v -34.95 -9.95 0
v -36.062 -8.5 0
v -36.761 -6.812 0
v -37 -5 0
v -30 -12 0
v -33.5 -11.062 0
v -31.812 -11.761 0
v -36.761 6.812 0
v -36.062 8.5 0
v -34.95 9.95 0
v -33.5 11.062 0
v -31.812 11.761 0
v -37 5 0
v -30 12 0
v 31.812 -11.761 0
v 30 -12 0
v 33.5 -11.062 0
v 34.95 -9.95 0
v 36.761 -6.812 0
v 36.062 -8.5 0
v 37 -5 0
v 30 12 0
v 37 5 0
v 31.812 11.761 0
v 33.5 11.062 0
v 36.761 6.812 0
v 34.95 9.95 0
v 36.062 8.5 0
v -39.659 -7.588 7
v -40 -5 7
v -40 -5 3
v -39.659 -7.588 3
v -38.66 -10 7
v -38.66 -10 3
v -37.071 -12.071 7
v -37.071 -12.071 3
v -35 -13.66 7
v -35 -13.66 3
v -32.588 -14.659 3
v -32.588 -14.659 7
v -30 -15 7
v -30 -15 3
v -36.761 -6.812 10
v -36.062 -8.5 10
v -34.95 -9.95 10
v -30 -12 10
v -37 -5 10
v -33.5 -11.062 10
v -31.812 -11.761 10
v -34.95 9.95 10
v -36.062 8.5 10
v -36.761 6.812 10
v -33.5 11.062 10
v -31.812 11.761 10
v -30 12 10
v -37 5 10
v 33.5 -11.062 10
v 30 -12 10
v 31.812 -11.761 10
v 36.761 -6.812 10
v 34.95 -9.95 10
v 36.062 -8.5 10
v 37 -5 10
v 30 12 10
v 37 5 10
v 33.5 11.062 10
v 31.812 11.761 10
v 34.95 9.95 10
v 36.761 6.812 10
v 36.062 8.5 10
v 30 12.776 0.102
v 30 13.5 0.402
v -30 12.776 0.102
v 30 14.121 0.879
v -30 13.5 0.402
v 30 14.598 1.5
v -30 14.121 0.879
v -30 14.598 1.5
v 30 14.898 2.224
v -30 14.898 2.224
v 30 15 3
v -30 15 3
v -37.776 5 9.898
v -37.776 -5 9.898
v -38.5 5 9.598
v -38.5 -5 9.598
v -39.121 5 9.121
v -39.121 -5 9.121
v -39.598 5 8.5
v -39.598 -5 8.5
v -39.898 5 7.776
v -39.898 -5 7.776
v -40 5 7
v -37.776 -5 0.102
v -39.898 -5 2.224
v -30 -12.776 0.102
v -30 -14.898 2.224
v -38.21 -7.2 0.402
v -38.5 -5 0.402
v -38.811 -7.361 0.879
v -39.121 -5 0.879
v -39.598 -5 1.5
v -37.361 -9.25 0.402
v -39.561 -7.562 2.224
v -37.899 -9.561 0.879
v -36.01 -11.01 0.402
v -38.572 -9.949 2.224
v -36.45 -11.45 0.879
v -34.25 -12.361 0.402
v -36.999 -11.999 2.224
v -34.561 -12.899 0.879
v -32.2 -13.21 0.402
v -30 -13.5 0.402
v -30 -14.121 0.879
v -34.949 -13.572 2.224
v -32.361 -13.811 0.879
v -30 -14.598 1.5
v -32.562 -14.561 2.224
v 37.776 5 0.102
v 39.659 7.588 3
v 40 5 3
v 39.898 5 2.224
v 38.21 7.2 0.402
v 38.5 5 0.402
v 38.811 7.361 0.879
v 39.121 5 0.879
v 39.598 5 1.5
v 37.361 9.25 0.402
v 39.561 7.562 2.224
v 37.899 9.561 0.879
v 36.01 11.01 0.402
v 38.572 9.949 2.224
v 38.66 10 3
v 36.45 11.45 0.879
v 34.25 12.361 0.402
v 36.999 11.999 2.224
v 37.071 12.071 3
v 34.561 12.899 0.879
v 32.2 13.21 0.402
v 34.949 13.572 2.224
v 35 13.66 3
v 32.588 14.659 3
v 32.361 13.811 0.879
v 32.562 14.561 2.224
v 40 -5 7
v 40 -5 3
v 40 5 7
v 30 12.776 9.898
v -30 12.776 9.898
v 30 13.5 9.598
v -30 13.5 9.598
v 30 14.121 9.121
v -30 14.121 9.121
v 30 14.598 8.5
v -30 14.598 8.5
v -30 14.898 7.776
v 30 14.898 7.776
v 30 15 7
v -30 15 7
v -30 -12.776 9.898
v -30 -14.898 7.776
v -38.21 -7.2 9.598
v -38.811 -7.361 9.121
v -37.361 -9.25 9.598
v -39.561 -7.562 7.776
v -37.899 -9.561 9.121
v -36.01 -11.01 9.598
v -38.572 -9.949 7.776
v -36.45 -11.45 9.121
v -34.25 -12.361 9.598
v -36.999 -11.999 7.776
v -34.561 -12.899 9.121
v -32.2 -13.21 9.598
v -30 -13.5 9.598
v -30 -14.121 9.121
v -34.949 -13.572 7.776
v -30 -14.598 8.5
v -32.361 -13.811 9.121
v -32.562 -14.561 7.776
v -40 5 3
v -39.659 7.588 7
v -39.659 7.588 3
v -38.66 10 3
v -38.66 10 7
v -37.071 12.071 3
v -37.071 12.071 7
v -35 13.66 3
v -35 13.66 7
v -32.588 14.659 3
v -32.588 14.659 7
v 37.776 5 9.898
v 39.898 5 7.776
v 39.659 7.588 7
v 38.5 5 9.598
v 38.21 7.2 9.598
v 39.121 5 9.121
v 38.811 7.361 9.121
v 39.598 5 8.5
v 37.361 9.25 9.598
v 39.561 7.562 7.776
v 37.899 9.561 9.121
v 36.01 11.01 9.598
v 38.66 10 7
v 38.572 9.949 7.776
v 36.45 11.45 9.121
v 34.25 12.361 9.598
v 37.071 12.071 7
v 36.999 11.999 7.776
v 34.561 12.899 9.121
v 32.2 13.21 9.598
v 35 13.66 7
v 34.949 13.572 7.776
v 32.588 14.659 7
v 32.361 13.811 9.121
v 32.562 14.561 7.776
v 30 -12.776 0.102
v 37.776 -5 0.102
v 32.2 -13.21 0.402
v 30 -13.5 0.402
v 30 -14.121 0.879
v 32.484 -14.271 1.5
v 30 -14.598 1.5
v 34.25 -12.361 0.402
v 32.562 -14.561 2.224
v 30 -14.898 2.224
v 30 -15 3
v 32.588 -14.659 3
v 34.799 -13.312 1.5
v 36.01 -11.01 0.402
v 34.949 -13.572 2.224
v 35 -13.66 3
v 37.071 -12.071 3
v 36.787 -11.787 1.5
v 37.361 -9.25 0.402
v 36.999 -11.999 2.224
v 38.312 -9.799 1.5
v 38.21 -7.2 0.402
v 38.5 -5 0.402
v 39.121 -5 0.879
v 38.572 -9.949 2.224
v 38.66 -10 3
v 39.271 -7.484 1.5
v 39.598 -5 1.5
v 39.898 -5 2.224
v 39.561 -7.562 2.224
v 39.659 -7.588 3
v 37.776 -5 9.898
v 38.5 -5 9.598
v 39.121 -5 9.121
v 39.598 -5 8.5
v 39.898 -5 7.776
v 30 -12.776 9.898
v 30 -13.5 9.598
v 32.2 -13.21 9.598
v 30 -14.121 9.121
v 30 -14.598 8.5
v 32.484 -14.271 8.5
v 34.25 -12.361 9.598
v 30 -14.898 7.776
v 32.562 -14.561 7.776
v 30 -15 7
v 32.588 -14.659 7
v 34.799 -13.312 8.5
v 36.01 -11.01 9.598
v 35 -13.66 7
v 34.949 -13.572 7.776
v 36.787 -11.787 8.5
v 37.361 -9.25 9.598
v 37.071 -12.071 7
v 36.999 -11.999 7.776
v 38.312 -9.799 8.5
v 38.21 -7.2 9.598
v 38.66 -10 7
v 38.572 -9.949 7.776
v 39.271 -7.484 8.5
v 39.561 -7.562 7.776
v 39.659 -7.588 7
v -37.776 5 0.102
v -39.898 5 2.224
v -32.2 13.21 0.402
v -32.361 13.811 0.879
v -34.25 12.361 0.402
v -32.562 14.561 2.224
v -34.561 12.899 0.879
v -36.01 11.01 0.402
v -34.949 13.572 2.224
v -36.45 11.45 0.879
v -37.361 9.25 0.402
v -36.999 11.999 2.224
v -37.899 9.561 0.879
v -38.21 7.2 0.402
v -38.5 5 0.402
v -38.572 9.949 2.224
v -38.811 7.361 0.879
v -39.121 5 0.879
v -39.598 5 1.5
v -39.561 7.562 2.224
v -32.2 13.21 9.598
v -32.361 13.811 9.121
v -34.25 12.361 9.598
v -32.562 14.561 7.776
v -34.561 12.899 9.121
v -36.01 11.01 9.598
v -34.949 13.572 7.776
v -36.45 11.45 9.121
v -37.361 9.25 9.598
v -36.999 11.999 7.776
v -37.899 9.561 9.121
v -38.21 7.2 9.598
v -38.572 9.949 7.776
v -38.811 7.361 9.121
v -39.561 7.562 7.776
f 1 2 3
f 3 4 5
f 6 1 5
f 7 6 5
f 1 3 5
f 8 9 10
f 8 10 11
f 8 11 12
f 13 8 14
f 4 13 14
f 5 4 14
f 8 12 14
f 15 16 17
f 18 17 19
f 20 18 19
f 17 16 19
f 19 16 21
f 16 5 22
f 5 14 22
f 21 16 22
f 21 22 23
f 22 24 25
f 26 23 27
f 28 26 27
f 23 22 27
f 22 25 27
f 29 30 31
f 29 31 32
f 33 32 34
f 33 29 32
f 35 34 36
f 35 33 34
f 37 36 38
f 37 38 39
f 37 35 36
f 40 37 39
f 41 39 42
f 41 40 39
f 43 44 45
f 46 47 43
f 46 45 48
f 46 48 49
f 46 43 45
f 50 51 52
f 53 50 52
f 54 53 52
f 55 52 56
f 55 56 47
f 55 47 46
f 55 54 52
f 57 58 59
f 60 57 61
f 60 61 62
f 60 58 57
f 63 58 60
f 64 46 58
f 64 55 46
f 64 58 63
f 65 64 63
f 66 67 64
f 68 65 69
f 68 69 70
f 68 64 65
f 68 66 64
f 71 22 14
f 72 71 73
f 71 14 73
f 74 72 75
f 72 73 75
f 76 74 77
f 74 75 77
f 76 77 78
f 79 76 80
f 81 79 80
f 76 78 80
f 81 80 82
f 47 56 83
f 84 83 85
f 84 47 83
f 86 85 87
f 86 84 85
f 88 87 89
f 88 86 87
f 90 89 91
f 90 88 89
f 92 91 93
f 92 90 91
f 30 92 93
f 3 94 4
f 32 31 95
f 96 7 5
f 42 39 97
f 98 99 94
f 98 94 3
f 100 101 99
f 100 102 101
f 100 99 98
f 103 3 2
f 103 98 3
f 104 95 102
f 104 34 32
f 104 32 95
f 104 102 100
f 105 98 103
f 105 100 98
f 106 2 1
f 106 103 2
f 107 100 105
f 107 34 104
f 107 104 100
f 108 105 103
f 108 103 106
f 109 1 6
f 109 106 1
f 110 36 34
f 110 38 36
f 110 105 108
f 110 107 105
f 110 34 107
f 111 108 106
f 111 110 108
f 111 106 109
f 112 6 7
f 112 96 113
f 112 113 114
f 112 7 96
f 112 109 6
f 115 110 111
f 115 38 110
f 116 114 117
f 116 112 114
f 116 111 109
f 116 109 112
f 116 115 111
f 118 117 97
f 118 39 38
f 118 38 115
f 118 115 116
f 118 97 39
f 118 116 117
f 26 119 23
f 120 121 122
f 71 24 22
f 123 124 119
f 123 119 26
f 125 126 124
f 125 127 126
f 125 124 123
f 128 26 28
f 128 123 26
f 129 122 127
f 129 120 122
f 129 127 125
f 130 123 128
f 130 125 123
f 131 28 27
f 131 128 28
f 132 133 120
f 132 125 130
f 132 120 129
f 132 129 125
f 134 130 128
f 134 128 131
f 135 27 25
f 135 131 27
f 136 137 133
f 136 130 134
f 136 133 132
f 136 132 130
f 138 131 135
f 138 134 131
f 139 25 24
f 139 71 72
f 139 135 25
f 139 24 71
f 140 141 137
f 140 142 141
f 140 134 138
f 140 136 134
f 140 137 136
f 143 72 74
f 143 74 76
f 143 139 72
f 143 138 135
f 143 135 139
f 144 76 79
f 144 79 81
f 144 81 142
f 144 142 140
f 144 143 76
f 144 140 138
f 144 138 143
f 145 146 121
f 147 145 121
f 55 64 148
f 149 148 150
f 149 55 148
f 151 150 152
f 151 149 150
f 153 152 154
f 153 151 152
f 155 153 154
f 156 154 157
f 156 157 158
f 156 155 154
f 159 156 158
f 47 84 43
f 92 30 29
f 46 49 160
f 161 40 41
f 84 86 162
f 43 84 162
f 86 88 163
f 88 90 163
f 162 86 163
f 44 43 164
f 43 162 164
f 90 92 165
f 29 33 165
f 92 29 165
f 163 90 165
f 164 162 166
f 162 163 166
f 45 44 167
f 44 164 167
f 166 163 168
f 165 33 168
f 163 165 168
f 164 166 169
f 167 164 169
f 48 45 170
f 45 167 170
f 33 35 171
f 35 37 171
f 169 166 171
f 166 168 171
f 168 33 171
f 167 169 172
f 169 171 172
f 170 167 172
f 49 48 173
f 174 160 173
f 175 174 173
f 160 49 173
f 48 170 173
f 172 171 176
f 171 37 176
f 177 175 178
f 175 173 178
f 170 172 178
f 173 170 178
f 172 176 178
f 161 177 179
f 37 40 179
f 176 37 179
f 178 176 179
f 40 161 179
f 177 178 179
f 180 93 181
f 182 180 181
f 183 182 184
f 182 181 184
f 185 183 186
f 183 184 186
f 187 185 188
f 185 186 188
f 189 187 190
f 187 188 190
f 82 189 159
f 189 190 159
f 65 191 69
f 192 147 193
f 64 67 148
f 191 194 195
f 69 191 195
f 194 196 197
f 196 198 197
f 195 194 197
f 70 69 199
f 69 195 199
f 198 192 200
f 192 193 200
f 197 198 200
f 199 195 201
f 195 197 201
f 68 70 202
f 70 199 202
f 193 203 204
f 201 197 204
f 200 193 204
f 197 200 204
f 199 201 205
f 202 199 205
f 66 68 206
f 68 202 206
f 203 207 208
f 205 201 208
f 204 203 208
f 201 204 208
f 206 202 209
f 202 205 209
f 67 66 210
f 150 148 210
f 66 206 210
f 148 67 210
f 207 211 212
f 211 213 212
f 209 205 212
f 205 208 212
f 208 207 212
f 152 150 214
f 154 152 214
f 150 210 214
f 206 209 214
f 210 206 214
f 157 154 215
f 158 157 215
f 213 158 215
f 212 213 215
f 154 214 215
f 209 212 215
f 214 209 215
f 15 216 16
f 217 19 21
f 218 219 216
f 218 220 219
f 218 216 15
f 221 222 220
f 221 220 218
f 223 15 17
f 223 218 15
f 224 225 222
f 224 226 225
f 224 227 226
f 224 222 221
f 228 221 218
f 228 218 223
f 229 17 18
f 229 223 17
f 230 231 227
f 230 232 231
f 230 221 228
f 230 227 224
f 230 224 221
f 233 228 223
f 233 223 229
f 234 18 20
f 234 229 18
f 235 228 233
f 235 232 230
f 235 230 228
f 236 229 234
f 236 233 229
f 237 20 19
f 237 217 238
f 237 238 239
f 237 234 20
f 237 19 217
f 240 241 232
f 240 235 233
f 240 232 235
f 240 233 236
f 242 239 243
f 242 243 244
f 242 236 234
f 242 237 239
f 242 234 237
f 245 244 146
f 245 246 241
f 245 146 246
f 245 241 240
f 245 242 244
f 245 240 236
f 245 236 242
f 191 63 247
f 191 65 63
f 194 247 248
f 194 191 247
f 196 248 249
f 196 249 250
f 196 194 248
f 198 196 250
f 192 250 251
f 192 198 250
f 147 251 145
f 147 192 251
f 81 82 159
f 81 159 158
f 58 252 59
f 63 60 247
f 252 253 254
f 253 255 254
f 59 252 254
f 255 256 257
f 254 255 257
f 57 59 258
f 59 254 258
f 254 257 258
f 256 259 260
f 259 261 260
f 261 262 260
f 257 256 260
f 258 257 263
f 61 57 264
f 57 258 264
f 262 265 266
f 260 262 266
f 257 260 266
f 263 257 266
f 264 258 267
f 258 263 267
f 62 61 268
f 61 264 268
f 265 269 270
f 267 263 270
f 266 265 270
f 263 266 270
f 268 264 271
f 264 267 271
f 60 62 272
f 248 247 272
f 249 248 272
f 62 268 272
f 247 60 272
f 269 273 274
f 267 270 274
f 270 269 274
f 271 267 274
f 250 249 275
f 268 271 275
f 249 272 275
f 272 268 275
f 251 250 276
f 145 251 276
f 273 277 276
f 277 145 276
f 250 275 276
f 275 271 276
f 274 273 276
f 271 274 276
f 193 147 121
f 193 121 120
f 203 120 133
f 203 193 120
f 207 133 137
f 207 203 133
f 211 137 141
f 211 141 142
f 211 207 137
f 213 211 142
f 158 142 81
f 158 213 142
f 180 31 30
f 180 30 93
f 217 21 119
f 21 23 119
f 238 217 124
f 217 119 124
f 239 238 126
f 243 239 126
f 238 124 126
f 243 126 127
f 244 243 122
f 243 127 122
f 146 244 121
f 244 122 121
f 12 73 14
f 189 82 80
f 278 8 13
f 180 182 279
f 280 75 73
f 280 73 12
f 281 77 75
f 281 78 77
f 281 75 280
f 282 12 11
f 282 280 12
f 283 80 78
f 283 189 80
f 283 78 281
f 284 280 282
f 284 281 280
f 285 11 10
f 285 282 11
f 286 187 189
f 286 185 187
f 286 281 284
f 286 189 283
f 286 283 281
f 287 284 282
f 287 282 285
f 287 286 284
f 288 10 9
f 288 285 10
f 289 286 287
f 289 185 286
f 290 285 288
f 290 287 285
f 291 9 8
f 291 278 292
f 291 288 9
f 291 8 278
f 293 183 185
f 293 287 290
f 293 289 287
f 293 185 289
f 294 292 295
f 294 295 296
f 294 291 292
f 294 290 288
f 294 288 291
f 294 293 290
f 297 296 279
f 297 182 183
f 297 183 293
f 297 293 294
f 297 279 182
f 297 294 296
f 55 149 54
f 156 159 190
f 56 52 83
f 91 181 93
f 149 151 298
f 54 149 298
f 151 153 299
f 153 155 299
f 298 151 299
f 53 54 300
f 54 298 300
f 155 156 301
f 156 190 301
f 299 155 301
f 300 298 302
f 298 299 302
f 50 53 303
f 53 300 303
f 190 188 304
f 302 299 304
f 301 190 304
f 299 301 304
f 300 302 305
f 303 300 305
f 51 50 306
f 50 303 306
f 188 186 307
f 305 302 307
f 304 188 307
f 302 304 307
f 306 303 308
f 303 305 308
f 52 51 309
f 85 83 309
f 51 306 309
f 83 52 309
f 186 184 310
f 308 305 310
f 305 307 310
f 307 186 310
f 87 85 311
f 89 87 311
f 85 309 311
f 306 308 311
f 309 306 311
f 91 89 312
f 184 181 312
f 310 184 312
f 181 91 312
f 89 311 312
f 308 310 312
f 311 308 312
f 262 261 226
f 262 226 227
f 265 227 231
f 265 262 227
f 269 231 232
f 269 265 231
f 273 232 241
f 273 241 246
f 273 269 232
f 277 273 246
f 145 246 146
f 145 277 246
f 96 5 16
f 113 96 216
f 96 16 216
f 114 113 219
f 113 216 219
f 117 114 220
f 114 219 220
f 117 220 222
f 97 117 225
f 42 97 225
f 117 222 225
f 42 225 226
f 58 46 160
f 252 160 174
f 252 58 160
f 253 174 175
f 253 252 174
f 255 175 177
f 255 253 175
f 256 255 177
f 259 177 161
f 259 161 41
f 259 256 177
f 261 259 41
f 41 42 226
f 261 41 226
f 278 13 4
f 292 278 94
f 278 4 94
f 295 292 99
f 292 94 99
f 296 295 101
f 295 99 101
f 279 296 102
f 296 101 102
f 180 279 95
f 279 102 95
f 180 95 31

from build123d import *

# Parameters (mm, degrees)
SKETCH_1_W      = 80
SKETCH_1_H      = 30
EXTRUDE_1_DEPTH = 10
FILLET_1_R      = 10
FILLET_3_R      = 3


with BuildPart() as part:
    # 草图1 → 凸台-拉伸1 (new body)
    with BuildSketch(Plane.XY):
        Rectangle(SKETCH_1_W, SKETCH_1_H)
    extrude(amount=EXTRUDE_1_DEPTH)

    # 圆角1
    fillet_1_edges = [part.edges().sort_by_distance(p)[0] for p in [
        (-40, 15, 5),
        (40, 15, 5),
        (40, -15, 5),
        (-40, -15, 5),
    ]]
    fillet(fillet_1_edges, radius=FILLET_1_R)

    # 圆角3
    fillet_3_edges = [part.edges().sort_by_distance(p)[0] for p in [
        (40, 0, 0),
        (40, 0, 10),
        (-40, 0, 0),
        (0, 15, 0),
        (0, -15, 0),
        (-37.071067812, -12.071067812, 0),
        (-37.071067812, 12.071067812, 0),
        (37.071067812, 12.071067812, 0),
        (37.071067812, -12.071067812, 0),
        (0, -15, 10),
        (-40, 0, 10),
        (0, 15, 10),
        (-37.071067812, -12.071067812, 10),
        (-37.071067812, 12.071067812, 10),
        (37.071067812, 12.071067812, 10),
        (37.071067812, -12.071067812, 10),
    ]]
    fillet(fillet_3_edges, radius=FILLET_3_R)


solid = part.part
